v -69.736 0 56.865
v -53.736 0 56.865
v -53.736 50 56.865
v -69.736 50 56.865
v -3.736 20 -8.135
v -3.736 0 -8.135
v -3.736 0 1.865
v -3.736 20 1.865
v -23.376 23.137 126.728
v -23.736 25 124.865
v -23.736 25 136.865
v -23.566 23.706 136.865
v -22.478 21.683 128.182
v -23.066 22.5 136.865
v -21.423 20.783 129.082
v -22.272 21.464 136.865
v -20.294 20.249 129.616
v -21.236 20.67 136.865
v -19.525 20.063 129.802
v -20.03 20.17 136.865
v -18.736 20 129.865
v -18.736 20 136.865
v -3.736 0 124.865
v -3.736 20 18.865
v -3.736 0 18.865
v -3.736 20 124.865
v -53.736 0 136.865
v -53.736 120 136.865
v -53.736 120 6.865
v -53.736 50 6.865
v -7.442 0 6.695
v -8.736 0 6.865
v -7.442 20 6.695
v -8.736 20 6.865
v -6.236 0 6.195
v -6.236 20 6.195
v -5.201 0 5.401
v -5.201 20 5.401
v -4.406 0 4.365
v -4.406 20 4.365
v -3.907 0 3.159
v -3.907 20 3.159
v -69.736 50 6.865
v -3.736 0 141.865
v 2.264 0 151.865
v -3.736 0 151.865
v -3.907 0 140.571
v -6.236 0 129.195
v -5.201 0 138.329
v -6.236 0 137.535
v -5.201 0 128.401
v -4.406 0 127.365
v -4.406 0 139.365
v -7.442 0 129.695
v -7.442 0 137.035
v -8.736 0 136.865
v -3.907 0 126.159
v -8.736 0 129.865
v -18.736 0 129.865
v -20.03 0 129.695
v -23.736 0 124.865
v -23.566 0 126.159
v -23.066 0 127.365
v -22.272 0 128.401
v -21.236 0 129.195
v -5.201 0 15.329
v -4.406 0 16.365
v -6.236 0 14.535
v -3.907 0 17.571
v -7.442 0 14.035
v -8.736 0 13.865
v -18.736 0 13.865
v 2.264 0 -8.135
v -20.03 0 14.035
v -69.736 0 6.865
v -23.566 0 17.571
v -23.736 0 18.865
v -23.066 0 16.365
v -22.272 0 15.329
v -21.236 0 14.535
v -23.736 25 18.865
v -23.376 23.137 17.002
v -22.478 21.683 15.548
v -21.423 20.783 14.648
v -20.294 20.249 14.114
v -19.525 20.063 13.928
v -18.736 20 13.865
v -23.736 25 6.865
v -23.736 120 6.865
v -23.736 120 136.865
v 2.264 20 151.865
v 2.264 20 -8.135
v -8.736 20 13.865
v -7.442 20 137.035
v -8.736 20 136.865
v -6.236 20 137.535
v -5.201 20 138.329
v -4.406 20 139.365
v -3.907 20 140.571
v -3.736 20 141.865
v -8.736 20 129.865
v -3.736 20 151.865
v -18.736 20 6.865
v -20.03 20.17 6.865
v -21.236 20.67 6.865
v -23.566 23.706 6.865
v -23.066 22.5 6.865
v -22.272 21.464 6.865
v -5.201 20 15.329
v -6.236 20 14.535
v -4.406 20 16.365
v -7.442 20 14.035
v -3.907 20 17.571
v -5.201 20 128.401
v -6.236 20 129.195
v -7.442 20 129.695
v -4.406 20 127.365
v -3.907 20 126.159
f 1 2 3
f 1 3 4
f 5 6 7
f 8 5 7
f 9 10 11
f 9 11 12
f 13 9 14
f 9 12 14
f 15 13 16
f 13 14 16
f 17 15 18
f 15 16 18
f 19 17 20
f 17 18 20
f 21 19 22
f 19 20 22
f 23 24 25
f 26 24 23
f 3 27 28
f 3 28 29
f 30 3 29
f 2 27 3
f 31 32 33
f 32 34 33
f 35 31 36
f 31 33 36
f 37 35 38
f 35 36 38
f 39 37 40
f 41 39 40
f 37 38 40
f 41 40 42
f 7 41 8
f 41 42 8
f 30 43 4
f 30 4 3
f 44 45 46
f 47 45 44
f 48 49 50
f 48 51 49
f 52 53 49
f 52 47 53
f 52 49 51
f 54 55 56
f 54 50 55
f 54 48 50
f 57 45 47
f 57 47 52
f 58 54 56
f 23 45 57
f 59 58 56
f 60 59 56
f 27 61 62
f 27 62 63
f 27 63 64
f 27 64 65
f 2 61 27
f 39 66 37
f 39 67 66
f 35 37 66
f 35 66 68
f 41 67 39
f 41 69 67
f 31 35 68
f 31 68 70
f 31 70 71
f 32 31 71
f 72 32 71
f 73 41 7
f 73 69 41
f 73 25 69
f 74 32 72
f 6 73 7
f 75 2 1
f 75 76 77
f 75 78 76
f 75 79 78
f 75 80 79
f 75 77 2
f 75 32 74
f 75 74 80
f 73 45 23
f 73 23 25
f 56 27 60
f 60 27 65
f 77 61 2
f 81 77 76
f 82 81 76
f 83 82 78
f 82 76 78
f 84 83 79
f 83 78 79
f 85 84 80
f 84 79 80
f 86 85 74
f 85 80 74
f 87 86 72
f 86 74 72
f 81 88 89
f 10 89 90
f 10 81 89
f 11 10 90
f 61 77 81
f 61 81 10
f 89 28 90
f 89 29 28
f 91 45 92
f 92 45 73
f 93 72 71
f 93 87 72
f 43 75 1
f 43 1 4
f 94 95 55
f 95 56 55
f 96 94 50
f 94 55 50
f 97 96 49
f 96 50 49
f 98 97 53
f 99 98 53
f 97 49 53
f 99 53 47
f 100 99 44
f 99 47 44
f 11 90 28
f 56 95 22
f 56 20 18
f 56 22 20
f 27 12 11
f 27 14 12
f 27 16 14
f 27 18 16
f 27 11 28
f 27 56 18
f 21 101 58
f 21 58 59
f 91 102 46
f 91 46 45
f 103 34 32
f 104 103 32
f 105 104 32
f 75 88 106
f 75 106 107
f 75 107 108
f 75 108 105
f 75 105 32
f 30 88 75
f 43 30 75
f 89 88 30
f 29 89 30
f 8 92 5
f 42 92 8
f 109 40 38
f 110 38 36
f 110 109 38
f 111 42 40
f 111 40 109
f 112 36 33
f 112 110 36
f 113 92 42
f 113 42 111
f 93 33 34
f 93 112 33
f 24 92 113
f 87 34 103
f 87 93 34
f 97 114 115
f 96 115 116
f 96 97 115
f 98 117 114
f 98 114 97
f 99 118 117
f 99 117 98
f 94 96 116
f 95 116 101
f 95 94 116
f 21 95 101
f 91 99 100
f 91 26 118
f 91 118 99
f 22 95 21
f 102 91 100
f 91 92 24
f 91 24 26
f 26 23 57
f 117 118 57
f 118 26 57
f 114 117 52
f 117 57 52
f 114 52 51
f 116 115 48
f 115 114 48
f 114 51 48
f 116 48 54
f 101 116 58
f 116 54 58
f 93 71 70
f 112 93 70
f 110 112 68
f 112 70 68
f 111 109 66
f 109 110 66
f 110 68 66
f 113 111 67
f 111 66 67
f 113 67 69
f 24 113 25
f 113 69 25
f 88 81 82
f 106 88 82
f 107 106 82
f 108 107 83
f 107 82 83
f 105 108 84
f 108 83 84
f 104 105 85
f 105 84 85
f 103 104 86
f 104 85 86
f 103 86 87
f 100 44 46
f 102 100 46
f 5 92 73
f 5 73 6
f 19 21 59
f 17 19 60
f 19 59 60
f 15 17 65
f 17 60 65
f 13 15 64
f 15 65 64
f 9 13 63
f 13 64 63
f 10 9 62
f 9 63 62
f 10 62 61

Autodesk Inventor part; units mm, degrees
ref_plane "YZ Plane" through (0, 0, 0) normal (1, 0, 0) x (0, 1, 0)
ref_plane "XZ Plane" through (0, 0, 0) normal (0, 1, 0) x (-1, 0, 0)
ref_plane "XY Plane" through (0, 0, 0) normal (0, 0, 1) x (1, 0, 0)
sketch "Sketch1" plane through (0, 0, 0) normal (0, 1, 0) x (-1, 0, 0)
  line L0 (3.7362, 151.865) -> (-2.2638, 151.865)
  line L1 (-2.2638, 151.865) -> (-2.2638, -8.135)
  line L2 (-2.2638, -8.135) -> (3.7362, -8.135)
  line L3 (3.7362, -8.135) -> (3.7362, 151.865)
  point P0 (0, 0)
  dimension "d0" = 6
  dimension "d1" = 160
extrude "Extrusion1" add sketch "Sketch1" along normal blind 20
sketch "Sketch2" plane through (-3.7362, 0, -8.135) normal (-1, 0, 0) x (0, 0, 1)
  line L0 (160, 20) -> (0, 20) projected
  line L1 (15, 20) -> (145, 20)
  line L2 (145, 20) -> (145, 0)
  line L3 (145, 0) -> (15, 0)
  line L4 (15, 0) -> (15, 20)
  line L5 (0, 0) -> (0, 20) projected
  line L6 (160, 0) -> (160, 20) projected
  point P0 (8.135, 0)
  dimension "d4" = 15
  dimension "d5" = 15
  dimension "d6" = 20
extrude "Extrusion2" add sketch "Sketch2" along normal blind 50
sketch "Sketch3" plane through (0, 20, 0) normal (0, 1, 0) x (1, 0, 0)
  line L0 (-3.7362, -136.865) -> (-53.7362, -136.865) projected
  line L1 (-53.7362, -6.865) -> (-23.7362, -6.865)
  line L2 (-23.7362, -6.865) -> (-23.7362, -136.865)
  line L3 (-23.7362, -136.865) -> (-53.7362, -136.865)
  line L4 (-53.7362, -136.865) -> (-53.7362, -6.865)
  point P0 (0, 0)
  dimension "d9" = 30
extrude "Extrusion3" add sketch "Sketch3" along normal blind 100
sketch "Sketch4" plane through (-3.7362, 0, 6.865) normal (0, 0, -1) x (-1, 0, 0)
  line L0 (50, 0) -> (66, 0)
  line L1 (66, 0) -> (66, 50)
  line L2 (66, 50) -> (50, 50)
  line L3 (50, 50) -> (50, 0)
  point P0 (-3.7362, 0)
  dimension "d12" = 16
  dimension "d13" = 50
extrude "Extrusion4" add sketch "Sketch4" against normal blind 50
sketch "Sketch6" plane through (0, 20, 0) normal (0, 1, 0) x (1, 0, 0)
  line L0 (-23.7362, -6.865) -> (-23.7362, -136.865) projected
  line L1 (-3.7362, -129.865) -> (-23.7362, -129.865)
  line L2 (-23.7362, -129.865) -> (-23.7362, -13.865)
  line L3 (-23.7362, -13.865) -> (-3.7362, -13.865)
  line L4 (-3.7362, -13.865) -> (-3.7362, -129.865)
  line L5 (-3.7362, -136.865) -> (-23.7362, -136.865) projected
  line L6 (2.2638, -151.865) -> (2.2638, 8.135) projected
  line L7 (-3.7362, -6.865) -> (-23.7362, -6.865) projected
  point P0 (0, 0)
  dimension "d16" = 7
  dimension "d17" = 6
  dimension "d18" = 7
extrude "Extrusion5" cut sketch "Sketch6" against normal blind 50
fillet "Fillet1" radius 5 4 edges at (-23.7362, 20, 133.365) (-23.7362, 20, 10.365) (-23.7362, 10, 129.865) (-23.7362, 10, 13.865)
fillet "Fillet2" radius 5 4 edges at (-3.7362, 10, 129.865) (-3.7362, 10, 13.865) (-3.7362, 10, 6.865) (-3.7362, 10, 136.865)
properties part number "E_box"
